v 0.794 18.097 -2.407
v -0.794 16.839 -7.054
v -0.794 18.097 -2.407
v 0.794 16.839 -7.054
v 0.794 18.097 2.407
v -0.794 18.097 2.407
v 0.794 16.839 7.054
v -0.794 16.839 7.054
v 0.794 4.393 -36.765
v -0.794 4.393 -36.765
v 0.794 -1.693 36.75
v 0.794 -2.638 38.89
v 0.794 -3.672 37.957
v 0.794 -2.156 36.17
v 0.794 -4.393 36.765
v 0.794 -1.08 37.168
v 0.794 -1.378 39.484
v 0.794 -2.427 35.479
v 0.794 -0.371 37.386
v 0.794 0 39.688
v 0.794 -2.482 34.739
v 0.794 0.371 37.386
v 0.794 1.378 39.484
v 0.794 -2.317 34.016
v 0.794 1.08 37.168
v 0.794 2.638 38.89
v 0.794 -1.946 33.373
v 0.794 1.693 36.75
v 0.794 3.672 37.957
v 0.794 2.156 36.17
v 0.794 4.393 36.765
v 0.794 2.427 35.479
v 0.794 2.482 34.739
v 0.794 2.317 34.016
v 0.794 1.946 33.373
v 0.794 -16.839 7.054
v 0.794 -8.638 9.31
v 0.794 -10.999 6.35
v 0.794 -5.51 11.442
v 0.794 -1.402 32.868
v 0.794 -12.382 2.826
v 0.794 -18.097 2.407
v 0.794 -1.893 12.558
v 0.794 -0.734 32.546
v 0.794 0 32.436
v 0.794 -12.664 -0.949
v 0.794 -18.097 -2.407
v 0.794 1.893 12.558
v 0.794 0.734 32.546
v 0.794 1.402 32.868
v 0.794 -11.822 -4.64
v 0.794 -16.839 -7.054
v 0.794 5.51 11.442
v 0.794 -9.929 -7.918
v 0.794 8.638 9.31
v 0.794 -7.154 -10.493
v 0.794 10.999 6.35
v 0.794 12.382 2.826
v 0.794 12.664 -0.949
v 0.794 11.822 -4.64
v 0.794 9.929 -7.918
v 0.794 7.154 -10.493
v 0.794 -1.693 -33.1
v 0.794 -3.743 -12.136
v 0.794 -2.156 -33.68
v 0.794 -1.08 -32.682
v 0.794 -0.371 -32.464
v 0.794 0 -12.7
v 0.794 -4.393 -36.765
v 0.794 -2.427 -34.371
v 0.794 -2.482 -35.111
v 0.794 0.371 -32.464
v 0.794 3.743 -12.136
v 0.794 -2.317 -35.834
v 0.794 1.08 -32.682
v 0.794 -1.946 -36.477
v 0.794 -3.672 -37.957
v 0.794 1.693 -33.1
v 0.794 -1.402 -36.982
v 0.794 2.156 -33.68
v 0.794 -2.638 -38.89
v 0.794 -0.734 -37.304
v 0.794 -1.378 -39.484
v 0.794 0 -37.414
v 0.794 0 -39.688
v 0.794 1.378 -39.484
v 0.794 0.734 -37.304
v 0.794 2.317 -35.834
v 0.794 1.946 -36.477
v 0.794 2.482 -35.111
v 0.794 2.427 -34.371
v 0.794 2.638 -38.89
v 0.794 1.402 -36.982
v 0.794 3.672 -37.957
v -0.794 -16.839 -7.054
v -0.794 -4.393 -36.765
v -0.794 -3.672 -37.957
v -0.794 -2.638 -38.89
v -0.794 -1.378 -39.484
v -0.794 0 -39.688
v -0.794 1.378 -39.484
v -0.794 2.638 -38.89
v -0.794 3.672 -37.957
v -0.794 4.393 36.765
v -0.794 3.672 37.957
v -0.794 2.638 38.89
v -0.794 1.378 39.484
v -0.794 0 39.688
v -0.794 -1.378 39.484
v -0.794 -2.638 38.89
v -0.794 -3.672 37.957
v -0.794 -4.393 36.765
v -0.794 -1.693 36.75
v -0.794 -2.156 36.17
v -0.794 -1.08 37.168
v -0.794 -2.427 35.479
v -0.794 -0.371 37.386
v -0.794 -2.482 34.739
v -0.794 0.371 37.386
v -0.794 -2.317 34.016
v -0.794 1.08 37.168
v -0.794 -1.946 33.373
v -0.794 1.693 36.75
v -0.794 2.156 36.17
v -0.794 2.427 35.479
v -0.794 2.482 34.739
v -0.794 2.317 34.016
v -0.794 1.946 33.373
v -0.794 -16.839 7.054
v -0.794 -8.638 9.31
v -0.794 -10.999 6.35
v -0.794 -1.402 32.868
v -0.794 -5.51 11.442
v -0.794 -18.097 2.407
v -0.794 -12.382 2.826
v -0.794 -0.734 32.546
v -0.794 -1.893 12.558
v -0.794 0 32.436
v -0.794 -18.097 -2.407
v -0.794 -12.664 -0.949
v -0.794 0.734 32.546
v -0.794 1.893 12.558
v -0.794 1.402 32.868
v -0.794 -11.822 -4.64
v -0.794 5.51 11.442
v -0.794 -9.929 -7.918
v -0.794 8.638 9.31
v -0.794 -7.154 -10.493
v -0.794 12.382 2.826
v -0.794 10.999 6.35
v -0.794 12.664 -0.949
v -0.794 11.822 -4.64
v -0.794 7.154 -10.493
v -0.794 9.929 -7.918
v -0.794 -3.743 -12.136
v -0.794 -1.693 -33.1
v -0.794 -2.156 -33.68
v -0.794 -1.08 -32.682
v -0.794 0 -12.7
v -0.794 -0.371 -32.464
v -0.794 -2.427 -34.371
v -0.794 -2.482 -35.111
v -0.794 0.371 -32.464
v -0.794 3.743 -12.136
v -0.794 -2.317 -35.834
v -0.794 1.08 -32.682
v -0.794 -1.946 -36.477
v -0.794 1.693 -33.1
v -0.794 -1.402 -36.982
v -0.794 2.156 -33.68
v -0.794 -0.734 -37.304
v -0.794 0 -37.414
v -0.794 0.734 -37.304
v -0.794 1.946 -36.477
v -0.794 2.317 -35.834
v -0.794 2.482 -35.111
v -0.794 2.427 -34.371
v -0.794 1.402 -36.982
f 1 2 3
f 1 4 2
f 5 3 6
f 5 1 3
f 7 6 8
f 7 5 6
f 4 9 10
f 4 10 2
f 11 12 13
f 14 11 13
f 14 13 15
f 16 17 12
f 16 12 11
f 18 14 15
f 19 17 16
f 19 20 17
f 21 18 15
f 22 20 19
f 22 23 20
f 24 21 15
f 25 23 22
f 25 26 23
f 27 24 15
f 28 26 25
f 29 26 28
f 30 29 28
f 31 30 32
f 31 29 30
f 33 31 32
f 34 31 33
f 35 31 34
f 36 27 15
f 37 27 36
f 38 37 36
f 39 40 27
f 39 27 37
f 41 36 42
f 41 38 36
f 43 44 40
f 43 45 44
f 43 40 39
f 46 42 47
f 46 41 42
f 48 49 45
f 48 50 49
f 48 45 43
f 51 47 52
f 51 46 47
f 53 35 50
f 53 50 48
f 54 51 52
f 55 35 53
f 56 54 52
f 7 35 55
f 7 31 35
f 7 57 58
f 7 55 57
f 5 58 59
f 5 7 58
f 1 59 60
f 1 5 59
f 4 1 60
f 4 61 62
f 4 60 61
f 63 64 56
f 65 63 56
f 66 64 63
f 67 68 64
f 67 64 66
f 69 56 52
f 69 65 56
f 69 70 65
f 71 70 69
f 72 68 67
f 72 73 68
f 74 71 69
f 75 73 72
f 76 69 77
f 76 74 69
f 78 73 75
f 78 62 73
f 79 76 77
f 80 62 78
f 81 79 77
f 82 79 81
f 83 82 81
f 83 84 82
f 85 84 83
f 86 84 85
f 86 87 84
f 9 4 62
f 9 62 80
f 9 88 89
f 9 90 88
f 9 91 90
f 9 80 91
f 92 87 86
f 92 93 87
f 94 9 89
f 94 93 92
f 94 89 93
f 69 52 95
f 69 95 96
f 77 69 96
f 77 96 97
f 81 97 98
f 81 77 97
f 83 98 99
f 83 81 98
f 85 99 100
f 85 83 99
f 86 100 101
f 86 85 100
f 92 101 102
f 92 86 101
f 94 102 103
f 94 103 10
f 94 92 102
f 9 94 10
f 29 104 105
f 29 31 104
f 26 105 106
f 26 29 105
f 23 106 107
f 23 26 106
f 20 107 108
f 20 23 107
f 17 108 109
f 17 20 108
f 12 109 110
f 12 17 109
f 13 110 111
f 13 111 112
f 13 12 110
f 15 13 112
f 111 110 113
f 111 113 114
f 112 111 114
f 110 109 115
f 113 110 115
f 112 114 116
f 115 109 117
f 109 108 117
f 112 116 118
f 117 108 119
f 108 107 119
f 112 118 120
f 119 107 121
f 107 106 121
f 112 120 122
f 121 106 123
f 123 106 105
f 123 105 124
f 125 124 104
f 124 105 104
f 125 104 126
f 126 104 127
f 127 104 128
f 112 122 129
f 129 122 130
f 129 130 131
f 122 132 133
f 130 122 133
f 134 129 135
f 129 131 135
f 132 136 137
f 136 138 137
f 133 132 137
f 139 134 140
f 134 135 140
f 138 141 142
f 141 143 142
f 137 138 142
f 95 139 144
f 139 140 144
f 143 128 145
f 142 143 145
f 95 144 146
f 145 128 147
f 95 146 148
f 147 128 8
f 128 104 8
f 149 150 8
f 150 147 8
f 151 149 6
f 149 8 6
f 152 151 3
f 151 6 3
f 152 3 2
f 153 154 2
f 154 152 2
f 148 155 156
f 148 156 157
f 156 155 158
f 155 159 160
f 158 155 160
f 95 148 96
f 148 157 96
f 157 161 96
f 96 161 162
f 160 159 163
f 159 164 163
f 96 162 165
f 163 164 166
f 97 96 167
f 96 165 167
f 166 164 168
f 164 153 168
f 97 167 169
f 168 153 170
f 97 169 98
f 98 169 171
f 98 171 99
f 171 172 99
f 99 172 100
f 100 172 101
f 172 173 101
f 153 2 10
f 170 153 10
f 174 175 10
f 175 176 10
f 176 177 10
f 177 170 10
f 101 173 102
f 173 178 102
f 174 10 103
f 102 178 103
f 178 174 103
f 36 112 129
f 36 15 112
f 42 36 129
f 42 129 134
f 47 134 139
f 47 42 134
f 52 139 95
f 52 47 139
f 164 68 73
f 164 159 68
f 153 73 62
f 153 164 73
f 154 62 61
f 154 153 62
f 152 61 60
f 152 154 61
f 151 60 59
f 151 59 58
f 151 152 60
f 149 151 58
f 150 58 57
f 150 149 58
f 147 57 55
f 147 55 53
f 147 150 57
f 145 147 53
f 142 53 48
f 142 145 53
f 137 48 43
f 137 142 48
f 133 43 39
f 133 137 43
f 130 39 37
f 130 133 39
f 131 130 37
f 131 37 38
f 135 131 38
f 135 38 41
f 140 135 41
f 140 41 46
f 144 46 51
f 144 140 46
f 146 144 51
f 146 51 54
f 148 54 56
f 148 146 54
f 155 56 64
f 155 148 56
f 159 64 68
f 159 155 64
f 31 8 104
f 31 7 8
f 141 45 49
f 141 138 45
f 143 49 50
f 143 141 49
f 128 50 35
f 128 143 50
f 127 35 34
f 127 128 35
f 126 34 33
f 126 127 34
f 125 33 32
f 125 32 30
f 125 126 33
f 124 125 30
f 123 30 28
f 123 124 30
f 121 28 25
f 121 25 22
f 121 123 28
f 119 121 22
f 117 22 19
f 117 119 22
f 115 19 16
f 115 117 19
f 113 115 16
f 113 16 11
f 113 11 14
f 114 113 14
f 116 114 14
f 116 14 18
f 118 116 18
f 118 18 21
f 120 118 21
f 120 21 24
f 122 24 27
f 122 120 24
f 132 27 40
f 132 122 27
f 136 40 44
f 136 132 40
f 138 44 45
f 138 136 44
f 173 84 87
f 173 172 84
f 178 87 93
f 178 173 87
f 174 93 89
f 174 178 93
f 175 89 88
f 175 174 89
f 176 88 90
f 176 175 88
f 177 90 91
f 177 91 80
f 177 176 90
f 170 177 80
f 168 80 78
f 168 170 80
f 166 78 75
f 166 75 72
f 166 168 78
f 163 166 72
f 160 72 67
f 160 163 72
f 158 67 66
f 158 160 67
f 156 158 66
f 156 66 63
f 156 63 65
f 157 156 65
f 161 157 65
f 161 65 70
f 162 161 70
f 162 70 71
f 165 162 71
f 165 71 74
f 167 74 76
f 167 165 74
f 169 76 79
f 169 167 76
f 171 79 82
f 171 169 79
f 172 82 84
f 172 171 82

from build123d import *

# Parameters (mm, degrees)
SKETCH1_R           = 12.7
SKETCH1_R_2         = 2.4892
BOSS_EXTRUDE1_DEPTH = 0.79375


with BuildPart() as part:
    # Sketch1 → Boss-Extrude1 (new, symmetric)
    with BuildSketch(Plane(origin=(0, 0, 0), x_dir=(0, 0, -1), z_dir=(1, 0, 0))):
        with BuildLine():
            Line((-36.765056818, -4.392675398), (-7.053551136, -16.838589027))
            ThreePointArc((-7.053551136, -16.838589027), (0, -18.25625), (7.053551136, -16.838589027))
            Line((7.053551136, -16.838589027), (36.765056818, -4.392675398))
            ThreePointArc((36.765056818, -4.392675398), (39.6875, 0), (36.765056818, 4.392675398))
            Line((36.765056818, 4.392675398), (7.053551136, 16.838589027))
            ThreePointArc((7.053551136, 16.838589027), (0, 18.25625), (-7.053551136, 16.838589027))
            Line((-7.053551136, 16.838589027), (-36.765056818, 4.392675398))
            ThreePointArc((-36.765056818, 4.392675398), (-39.6875, 0), (-36.765056818, -4.392675398))
        make_face()
        Circle(SKETCH1_R, mode=Mode.SUBTRACT)
        with Locations((34.925, 0)):
            Circle(SKETCH1_R_2, mode=Mode.SUBTRACT)
        with Locations((-34.925, 0)):
            Circle(SKETCH1_R_2, mode=Mode.SUBTRACT)
    extrude(amount=BOSS_EXTRUDE1_DEPTH, both=True)


solid = part.part
